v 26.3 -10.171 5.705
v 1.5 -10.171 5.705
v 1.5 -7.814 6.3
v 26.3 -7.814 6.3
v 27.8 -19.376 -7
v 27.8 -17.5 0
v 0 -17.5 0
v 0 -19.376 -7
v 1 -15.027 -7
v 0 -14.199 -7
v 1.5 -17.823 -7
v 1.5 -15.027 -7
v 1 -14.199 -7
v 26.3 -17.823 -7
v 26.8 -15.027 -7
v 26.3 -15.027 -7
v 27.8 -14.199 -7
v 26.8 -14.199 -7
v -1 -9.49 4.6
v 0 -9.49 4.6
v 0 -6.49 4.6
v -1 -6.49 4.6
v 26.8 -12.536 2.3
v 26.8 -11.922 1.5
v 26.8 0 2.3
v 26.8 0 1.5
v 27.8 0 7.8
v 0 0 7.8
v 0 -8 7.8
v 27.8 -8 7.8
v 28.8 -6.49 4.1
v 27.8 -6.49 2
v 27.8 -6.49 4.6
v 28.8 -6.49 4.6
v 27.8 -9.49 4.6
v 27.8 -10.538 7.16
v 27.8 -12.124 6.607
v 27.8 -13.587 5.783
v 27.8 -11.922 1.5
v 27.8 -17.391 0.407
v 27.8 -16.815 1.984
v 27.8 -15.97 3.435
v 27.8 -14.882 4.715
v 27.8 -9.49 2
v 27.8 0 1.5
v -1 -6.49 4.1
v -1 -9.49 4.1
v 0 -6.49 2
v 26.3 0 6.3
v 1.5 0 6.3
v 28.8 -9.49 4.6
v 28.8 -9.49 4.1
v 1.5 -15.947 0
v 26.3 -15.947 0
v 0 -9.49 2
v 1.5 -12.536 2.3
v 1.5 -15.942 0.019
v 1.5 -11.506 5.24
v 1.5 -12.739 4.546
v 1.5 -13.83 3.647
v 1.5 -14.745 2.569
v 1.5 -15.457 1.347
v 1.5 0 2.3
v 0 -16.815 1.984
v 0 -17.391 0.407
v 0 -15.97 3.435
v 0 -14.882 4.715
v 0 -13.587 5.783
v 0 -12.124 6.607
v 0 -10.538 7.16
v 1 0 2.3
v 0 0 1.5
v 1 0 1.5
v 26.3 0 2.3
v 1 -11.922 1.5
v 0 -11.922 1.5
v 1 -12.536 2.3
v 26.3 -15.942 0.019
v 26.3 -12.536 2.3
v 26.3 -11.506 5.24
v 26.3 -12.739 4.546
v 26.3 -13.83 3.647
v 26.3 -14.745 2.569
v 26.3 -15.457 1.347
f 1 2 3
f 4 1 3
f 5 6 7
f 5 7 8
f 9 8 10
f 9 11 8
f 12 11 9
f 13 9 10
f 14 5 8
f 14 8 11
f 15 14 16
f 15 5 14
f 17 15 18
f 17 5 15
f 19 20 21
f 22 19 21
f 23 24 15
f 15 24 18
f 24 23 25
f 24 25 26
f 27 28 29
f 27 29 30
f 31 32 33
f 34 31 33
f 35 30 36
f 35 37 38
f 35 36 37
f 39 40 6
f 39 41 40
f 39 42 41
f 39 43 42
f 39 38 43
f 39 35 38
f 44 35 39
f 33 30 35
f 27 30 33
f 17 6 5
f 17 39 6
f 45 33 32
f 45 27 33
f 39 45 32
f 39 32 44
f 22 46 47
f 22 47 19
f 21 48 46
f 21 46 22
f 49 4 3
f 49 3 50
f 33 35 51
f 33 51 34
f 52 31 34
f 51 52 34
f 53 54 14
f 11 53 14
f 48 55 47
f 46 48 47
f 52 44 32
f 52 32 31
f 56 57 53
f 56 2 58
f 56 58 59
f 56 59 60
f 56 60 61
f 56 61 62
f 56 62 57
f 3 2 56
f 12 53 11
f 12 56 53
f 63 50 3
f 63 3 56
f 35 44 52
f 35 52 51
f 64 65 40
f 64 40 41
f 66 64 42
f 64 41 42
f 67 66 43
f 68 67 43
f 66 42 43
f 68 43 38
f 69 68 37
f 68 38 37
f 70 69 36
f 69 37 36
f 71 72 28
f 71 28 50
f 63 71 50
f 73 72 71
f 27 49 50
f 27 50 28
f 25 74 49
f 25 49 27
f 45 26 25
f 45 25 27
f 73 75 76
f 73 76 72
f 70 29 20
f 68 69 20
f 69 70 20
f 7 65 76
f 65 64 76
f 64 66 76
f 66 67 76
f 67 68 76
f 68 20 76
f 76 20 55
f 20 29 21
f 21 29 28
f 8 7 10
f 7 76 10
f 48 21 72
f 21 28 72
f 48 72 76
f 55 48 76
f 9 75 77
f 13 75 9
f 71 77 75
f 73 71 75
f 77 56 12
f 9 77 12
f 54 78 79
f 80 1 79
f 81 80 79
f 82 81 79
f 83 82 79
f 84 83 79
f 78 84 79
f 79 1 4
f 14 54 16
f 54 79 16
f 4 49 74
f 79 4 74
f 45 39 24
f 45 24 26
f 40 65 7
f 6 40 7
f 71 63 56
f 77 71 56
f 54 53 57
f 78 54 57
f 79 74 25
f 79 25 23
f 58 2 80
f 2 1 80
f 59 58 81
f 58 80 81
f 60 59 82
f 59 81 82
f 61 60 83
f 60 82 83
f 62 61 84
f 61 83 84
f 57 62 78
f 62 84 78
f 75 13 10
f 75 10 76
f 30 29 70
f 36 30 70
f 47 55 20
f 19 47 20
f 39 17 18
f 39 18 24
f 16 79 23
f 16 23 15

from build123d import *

# Parameters (mm, degrees)
SKETCH_1_W          = 27.8
SKETCH_1_H          = 8
EXTRUDE_1_DEPTH     = 7.8
EXTRUDE_2_DEPTH     = 27.8
SKETCH_4_R          = 1.15
EXTRUDE_3_DEPTH     = 2
CUT_EXTRUDE_4_DEPTH = 24.8
SKETCH_15_W         = 27.8
SKETCH_15_H         = 4.251772847
EXTRUDE_4_DEPTH     = 1.9
FILLET_1_R          = 8
FILLET_2_R          = 9.5
EXTRUDE_5_DEPTH     = 27.8
CUT_EXTRUDE_6_DEPTH = 24.8
CUT_EXTRUDE_7_DEPTH = 40.8
SKETCH_21_W         = 2.6
SKETCH_21_H         = 3
EXTRUDE_6_DEPTH     = 1
CUT_EXTRUDE_8_DEPTH = 3
CUT_EXTRUDE_9_DEPTH = 0.5


with BuildPart() as part:
    # 草图1 → 凸台-拉伸1 (new body)
    with BuildSketch(Plane.XY):
        with Locations((13.9, -4)):
            Rectangle(SKETCH_1_W, SKETCH_1_H)
    extrude(amount=EXTRUDE_1_DEPTH)

    # 草图2 → 凸台-拉伸2 (add)
    with BuildSketch(Plane.ZY):
        Polygon((5.795554958, -15.947085729), (0, -17.5), (0, -8), (7.8, -8), align=None)
    extrude(amount=-EXTRUDE_2_DEPTH)

    # 草图4 → 凸台-拉伸3 (add)
    with BuildSketch(Plane(origin=(0, 0, -1.9), x_dir=(-1, 0, 0), z_dir=(0, 0, -1))):
        with BuildLine():
            Line((0, -2), (0, -4.7))
            Line((0, -4.7), (6, -4.7))
            ThreePointArc((6, -4.7), (6.353553391, -4.553553391), (6.5, -4.2))
            Line((6.5, -4.2), (6.5, -2))
            Line((6.5, -2), (6.5, 2.4))
            ThreePointArc((6.5, 2.4), (6.353553391, 2.753553391), (6, 2.9))
            Line((6, 2.9), (4, 2.9))
            ThreePointArc((4, 2.9), (2.232233047, 2.167766953), (1.5, 0.4))
            Line((1.5, 0.4), (1.5, -1.5))
            ThreePointArc((1.5, -1.5), (1.353553391, -1.853553391), (1, -2))
            Line((1, -2), (0, -2))
        make_face()
        with Locations((3.6, 0.5)):
            Circle(SKETCH_4_R, mode=Mode.SUBTRACT)
    extrude_3 = extrude(amount=-EXTRUDE_3_DEPTH)

    # 镜向1: 凸台-拉伸3 across plane
    add(extrude_3.mirror(Plane.ZY.offset(-13.9)))

    # 草图13 → 切除-拉伸4 (cut)
    with BuildSketch(Plane.ZY.offset(-1.5)):
        Polygon((1.5, 0), (1.5, -11.921695309), (0, -12.323619098), (0, -15.947085729), (4.556522218, -14.726169281), (6.3, -7.813748582), (6.3, 0), align=None)
    extrude(amount=-CUT_EXTRUDE_4_DEPTH, mode=Mode.SUBTRACT)

    # 草图15 → 凸台-拉伸4 (add)
    with BuildSketch(Plane(origin=(0, 0, 0), x_dir=(-1, 0, 0), z_dir=(0, 0, -1))):
        with Locations((-13.9, -4.125886424)):
            Rectangle(SKETCH_15_W, SKETCH_15_H)
    extrude(amount=EXTRUDE_4_DEPTH)

    # 圆角1
    fillet_1_edges = [part.edges().sort_by_distance(p)[0] for p in [
        (13.9, -14.726169281, 4.556522218),
    ]]
    fillet(fillet_1_edges, radius=FILLET_1_R)

    # 圆角2
    fillet_2_edges = [part.edges().sort_by_distance(p)[0] for p in [
        (13.9, -15.947085729, 5.795554958),
    ]]
    fillet(fillet_2_edges, radius=FILLET_2_R)

    # 草图17 → 凸台-拉伸5 (add)
    with BuildSketch(Plane(origin=(27.8, 0, 0), x_dir=(0, 0, -1), z_dir=(1, 0, 0))):
        Polygon((0, -17.5), (7, -19.375644347), (7, -12.646349174), (0, -10.770704827), align=None)
    extrude(amount=-EXTRUDE_5_DEPTH)

    # 草图18 → 切除-拉伸6 (cut)
    with BuildSketch(Plane.ZY.offset(-26.3)):
        Polygon((0, -12.323619098), (0, -15.947085729), (-7, -17.822730076), (-7, -14.199263445), align=None)
    extrude(amount=CUT_EXTRUDE_6_DEPTH, mode=Mode.SUBTRACT)

    # 草图19 → 切除-拉伸7 (cut)
    with BuildSketch(Plane(origin=(34.3, 0, 0), x_dir=(0, 0, -1), z_dir=(1, 0, 0))):
        Polygon((7, 2.9), (7, -14.199263445), (-1.5, -11.921695309), (-1.5, 2.9), align=None)
    extrude(amount=-CUT_EXTRUDE_7_DEPTH, mode=Mode.SUBTRACT)

    # 草图21 → 凸台-拉伸6 (add)
    with BuildSketch(Plane.ZY):
        with Locations((3.3, -7.99)):
            Rectangle(SKETCH_21_W, SKETCH_21_H)
    extrude_6 = extrude(amount=EXTRUDE_6_DEPTH)

    # 草图22 → 切除-拉伸8 (cut)
    with BuildSketch(Plane(origin=(0, -9.49, 0), x_dir=(-1, 0, 0), z_dir=(0, -1, 0))):
        Polygon((0, -2), (1, -4.1), (1, -2), align=None)
    cut_extrude_8 = extrude(amount=-CUT_EXTRUDE_8_DEPTH, mode=Mode.SUBTRACT)

    # 镜向5: 凸台-拉伸6, 切除-拉伸8 across plane
    add(extrude_6.mirror(Plane.ZY.offset(-13.9)))
    add(cut_extrude_8.mirror(Plane.ZY.offset(-13.9)), mode=Mode.SUBTRACT)

    # 草图23 → 切除-拉伸9 (cut)
    with BuildSketch(Plane.ZY.offset(-26.3)):
        Polygon((2.3, -12.5355569), (-7, -15.027484389), (-7, -14.199263445), (1.5, -11.921695309), (1.5, 0), (2.3, 0), align=None)
    cut_extrude_9 = extrude(amount=-CUT_EXTRUDE_9_DEPTH, mode=Mode.SUBTRACT)

    # 镜向6: 切除-拉伸9 across plane
    add(cut_extrude_9.mirror(Plane.ZY.offset(-13.9)), mode=Mode.SUBTRACT)


solid = part.part
